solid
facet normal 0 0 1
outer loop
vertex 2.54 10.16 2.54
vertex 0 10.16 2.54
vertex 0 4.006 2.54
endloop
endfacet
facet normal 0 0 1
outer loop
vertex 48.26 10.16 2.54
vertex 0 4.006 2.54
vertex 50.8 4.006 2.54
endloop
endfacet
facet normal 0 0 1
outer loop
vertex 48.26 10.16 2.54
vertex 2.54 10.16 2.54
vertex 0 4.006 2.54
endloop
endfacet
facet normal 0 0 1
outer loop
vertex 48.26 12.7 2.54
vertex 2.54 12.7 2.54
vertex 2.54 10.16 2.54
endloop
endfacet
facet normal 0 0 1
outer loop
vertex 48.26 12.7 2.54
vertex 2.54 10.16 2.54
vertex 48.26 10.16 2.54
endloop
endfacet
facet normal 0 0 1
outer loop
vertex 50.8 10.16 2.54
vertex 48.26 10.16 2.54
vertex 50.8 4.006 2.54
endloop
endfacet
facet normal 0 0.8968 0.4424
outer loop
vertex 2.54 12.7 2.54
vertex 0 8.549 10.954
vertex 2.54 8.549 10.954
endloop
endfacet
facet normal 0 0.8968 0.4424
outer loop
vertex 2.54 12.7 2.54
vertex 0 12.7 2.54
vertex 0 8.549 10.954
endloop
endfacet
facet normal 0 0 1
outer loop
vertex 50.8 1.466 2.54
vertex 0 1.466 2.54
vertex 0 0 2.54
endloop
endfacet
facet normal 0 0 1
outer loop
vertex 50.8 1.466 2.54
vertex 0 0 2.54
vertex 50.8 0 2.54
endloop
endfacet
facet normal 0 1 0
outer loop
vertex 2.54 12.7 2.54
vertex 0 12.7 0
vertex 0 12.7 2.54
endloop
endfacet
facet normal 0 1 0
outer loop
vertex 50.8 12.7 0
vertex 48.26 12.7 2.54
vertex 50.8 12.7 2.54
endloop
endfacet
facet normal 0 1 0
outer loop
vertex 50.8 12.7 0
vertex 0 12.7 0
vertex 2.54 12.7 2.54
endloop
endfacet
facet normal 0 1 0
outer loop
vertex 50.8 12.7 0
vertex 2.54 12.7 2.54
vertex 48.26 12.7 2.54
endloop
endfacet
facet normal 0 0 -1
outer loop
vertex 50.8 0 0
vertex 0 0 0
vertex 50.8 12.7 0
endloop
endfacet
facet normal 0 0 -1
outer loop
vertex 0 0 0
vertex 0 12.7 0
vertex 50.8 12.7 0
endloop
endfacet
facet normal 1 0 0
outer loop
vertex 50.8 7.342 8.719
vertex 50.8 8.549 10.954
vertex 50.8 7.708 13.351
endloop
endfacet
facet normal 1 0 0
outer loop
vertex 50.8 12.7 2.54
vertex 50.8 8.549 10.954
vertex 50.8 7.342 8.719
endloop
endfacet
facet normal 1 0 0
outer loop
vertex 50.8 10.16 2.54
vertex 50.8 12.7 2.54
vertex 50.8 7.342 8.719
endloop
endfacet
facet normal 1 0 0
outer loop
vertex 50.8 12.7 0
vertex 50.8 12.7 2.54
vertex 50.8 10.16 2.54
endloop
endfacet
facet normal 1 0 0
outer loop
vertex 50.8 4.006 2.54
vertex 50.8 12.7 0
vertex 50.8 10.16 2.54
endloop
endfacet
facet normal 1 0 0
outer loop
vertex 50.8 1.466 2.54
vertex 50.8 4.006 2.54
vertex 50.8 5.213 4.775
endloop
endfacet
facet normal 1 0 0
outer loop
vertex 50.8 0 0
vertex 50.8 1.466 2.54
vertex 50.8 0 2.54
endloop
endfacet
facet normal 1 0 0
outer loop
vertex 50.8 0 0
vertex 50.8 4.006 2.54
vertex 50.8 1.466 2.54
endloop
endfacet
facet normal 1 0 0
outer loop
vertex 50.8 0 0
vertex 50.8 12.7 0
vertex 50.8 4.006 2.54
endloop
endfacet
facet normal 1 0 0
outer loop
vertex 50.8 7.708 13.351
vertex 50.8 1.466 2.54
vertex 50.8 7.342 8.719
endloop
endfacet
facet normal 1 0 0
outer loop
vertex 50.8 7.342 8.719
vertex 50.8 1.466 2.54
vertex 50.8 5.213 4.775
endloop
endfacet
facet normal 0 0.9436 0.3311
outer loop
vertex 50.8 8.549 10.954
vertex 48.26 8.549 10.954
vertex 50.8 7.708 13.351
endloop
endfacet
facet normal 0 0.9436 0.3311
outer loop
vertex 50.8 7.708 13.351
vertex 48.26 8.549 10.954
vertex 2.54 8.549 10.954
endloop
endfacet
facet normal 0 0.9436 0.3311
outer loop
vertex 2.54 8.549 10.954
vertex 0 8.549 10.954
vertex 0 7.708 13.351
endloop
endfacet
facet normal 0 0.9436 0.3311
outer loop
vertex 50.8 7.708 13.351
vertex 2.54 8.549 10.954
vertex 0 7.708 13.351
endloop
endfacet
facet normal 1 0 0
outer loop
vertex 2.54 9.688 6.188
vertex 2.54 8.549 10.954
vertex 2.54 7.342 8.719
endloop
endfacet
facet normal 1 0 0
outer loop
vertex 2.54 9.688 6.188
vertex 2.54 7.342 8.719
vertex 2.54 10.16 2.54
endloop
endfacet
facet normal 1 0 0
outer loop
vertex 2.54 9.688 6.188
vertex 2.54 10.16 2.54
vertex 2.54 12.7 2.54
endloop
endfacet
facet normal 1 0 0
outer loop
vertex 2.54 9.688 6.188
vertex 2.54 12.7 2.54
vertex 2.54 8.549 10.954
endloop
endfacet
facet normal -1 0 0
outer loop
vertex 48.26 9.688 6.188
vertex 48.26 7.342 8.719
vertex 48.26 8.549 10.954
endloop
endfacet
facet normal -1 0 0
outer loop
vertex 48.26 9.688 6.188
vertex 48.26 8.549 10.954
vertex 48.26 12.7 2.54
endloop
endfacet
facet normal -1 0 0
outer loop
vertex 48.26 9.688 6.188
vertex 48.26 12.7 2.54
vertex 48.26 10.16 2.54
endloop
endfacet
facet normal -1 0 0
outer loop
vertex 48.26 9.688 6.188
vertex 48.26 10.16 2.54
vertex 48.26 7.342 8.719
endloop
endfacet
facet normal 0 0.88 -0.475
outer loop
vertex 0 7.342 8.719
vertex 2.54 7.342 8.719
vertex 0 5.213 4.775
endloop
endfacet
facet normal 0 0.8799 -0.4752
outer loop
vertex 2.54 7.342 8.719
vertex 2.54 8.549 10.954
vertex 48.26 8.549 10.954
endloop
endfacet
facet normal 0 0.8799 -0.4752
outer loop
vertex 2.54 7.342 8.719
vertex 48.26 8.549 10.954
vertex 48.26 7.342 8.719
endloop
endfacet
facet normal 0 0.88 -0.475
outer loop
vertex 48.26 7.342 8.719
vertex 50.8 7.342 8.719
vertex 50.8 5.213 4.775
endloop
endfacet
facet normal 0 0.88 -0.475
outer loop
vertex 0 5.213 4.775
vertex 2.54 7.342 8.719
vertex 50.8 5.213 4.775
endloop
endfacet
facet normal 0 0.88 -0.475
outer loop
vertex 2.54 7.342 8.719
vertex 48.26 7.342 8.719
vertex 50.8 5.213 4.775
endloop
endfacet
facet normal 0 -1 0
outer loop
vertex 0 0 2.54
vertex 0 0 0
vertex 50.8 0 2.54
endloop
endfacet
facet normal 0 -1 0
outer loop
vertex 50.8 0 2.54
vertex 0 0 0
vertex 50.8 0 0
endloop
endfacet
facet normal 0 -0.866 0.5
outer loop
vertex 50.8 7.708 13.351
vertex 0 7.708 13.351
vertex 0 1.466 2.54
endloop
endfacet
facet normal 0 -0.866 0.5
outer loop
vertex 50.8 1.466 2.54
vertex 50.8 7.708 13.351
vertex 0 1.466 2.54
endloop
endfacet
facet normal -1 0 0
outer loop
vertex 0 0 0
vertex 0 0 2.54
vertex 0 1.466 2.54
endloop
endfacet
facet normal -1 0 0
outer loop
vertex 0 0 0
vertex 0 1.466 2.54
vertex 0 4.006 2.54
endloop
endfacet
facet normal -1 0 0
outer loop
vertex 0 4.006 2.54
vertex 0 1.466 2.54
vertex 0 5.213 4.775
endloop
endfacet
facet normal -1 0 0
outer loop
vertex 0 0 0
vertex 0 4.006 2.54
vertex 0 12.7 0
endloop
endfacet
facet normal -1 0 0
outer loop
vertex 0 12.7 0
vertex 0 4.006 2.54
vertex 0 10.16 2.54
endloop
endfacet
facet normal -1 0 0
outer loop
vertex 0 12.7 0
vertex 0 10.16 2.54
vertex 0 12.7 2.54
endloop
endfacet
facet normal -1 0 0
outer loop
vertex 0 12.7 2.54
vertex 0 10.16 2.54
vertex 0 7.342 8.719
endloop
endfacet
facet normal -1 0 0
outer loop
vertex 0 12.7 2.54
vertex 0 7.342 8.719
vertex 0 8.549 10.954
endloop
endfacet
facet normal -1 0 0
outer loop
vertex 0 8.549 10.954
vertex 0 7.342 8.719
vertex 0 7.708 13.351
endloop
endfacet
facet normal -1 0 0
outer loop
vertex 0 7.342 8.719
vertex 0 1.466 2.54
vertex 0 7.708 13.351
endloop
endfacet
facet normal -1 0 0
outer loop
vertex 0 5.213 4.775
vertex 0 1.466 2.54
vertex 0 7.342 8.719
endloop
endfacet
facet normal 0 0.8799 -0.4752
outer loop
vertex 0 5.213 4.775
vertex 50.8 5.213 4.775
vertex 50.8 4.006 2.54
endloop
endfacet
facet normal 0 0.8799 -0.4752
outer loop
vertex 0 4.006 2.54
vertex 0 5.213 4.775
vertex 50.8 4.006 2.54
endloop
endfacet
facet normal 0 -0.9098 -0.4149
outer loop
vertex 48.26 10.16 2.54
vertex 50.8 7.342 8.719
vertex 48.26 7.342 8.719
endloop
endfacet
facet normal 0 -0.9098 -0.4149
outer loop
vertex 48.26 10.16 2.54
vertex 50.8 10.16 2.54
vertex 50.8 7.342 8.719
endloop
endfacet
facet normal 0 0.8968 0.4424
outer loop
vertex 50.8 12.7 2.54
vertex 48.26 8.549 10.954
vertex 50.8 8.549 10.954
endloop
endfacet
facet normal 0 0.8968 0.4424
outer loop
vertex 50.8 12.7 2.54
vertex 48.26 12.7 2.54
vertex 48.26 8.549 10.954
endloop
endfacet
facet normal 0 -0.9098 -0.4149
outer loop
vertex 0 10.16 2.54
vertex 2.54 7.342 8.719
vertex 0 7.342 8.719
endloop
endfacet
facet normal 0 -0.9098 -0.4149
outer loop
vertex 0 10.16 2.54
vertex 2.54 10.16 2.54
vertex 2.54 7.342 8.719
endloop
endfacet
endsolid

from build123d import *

# Parameters (mm, degrees)
F0_W      = 50.8
F0_H      = 12.7
F1_DEPTH  = 2.54
F3_DEPTH  = 50.8
F5_DEPTH  = 50.8
F7_DEPTH  = 50.8
F8_R      = 0.7792520308
F9_DEPTH  = 25.4
F11_DEPTH = 50.8
F13_W     = 2.54
F13_H     = 2.54
F12_W     = 2.54
F12_H     = 2.54
F16_W     = 2.54
F16_H     = 2.54
F15_W     = 2.54
F15_H     = 2.54


with BuildPart() as f1:
    # F0 (on Top) → F1 (new body)
    with BuildSketch(Plane.XY):
        with Locations((25.4, 6.35)):
            Rectangle(F0_W, F0_H)
    extrude(amount=F1_DEPTH)

    # F2 (on Right) → F3 (join)
    with BuildSketch(Plane.YZ):
        Polygon((7.7083574152, 13.351266686), (0, 0), (12.3911025003, 0), align=None)
    extrude(amount=F3_DEPTH)

    # F4 (on face) → F5 (cut)
    with BuildSketch(Plane.YZ.offset(50.8)):
        Polygon((8.549014916, 10.9544156338), (4.0064696837, 2.54), (11.5002377759, 2.54), align=None)
    extrude(amount=-F5_DEPTH, mode=Mode.SUBTRACT)



with BuildPart() as f7:
    # F6 (on face) → F7 (new body)
    with BuildSketch(Plane.YZ.offset(50.8)):
        Polygon((5.2130930665, 4.775097316), (4.0064696837, 2.54), (6.5464696837, 2.54), align=None)
    extrude(amount=-F7_DEPTH)


with BuildPart() as f1_1:
    add(f1.part)

    add(f7.part)  # F9 merges F7
    # F8 (on face) → F9 (join)
    with BuildSketch(Plane.YZ.offset(50.8)):
        with Locations((4.0064696837, 2.54)):
            Circle(F8_R)
    extrude(amount=-F9_DEPTH)

    # F10 (on face) → F11 (cut)
    with BuildSketch(Plane.YZ.offset(50.8)):
        Polygon((4.0064696837, 2.54), (6.5464696837, 2.54), (5.2130930665, 4.775097316), align=None)
    extrude(amount=-F11_DEPTH, mode=Mode.SUBTRACT)

    # F13 (on face) → F14 section 0
    with BuildSketch(Plane(origin=(0, 2.0405452679, -1.1015939289), x_dir=(-1, 0, 0), z_dir=(0, 0.8799595732, -0.4750485759))):
        with Locations((-49.53, 12.4306402674)):
            Rectangle(F13_W, F13_H)
    # F12 (on face) → F14 section 1
    with BuildSketch(Plane.XY.offset(2.54)):
        with Locations((49.53, 11.43)):
            Rectangle(F12_W, F12_H)
    loft()

    # F16 (on face) → F17 section 0
    with BuildSketch(Plane(origin=(0, 2.0405452679, -1.1015939289), x_dir=(-1, 0, 0), z_dir=(0, 0.8799595732, -0.4750485759))):
        with Locations((-1.27, 12.4306402674)):
            Rectangle(F16_W, F16_H)
    # F15 (on face) → F17 section 1
    with BuildSketch(Plane.XY.offset(2.54)):
        with Locations((1.27, 11.43)):
            Rectangle(F15_W, F15_H)
    loft()


solid = f1_1.part
